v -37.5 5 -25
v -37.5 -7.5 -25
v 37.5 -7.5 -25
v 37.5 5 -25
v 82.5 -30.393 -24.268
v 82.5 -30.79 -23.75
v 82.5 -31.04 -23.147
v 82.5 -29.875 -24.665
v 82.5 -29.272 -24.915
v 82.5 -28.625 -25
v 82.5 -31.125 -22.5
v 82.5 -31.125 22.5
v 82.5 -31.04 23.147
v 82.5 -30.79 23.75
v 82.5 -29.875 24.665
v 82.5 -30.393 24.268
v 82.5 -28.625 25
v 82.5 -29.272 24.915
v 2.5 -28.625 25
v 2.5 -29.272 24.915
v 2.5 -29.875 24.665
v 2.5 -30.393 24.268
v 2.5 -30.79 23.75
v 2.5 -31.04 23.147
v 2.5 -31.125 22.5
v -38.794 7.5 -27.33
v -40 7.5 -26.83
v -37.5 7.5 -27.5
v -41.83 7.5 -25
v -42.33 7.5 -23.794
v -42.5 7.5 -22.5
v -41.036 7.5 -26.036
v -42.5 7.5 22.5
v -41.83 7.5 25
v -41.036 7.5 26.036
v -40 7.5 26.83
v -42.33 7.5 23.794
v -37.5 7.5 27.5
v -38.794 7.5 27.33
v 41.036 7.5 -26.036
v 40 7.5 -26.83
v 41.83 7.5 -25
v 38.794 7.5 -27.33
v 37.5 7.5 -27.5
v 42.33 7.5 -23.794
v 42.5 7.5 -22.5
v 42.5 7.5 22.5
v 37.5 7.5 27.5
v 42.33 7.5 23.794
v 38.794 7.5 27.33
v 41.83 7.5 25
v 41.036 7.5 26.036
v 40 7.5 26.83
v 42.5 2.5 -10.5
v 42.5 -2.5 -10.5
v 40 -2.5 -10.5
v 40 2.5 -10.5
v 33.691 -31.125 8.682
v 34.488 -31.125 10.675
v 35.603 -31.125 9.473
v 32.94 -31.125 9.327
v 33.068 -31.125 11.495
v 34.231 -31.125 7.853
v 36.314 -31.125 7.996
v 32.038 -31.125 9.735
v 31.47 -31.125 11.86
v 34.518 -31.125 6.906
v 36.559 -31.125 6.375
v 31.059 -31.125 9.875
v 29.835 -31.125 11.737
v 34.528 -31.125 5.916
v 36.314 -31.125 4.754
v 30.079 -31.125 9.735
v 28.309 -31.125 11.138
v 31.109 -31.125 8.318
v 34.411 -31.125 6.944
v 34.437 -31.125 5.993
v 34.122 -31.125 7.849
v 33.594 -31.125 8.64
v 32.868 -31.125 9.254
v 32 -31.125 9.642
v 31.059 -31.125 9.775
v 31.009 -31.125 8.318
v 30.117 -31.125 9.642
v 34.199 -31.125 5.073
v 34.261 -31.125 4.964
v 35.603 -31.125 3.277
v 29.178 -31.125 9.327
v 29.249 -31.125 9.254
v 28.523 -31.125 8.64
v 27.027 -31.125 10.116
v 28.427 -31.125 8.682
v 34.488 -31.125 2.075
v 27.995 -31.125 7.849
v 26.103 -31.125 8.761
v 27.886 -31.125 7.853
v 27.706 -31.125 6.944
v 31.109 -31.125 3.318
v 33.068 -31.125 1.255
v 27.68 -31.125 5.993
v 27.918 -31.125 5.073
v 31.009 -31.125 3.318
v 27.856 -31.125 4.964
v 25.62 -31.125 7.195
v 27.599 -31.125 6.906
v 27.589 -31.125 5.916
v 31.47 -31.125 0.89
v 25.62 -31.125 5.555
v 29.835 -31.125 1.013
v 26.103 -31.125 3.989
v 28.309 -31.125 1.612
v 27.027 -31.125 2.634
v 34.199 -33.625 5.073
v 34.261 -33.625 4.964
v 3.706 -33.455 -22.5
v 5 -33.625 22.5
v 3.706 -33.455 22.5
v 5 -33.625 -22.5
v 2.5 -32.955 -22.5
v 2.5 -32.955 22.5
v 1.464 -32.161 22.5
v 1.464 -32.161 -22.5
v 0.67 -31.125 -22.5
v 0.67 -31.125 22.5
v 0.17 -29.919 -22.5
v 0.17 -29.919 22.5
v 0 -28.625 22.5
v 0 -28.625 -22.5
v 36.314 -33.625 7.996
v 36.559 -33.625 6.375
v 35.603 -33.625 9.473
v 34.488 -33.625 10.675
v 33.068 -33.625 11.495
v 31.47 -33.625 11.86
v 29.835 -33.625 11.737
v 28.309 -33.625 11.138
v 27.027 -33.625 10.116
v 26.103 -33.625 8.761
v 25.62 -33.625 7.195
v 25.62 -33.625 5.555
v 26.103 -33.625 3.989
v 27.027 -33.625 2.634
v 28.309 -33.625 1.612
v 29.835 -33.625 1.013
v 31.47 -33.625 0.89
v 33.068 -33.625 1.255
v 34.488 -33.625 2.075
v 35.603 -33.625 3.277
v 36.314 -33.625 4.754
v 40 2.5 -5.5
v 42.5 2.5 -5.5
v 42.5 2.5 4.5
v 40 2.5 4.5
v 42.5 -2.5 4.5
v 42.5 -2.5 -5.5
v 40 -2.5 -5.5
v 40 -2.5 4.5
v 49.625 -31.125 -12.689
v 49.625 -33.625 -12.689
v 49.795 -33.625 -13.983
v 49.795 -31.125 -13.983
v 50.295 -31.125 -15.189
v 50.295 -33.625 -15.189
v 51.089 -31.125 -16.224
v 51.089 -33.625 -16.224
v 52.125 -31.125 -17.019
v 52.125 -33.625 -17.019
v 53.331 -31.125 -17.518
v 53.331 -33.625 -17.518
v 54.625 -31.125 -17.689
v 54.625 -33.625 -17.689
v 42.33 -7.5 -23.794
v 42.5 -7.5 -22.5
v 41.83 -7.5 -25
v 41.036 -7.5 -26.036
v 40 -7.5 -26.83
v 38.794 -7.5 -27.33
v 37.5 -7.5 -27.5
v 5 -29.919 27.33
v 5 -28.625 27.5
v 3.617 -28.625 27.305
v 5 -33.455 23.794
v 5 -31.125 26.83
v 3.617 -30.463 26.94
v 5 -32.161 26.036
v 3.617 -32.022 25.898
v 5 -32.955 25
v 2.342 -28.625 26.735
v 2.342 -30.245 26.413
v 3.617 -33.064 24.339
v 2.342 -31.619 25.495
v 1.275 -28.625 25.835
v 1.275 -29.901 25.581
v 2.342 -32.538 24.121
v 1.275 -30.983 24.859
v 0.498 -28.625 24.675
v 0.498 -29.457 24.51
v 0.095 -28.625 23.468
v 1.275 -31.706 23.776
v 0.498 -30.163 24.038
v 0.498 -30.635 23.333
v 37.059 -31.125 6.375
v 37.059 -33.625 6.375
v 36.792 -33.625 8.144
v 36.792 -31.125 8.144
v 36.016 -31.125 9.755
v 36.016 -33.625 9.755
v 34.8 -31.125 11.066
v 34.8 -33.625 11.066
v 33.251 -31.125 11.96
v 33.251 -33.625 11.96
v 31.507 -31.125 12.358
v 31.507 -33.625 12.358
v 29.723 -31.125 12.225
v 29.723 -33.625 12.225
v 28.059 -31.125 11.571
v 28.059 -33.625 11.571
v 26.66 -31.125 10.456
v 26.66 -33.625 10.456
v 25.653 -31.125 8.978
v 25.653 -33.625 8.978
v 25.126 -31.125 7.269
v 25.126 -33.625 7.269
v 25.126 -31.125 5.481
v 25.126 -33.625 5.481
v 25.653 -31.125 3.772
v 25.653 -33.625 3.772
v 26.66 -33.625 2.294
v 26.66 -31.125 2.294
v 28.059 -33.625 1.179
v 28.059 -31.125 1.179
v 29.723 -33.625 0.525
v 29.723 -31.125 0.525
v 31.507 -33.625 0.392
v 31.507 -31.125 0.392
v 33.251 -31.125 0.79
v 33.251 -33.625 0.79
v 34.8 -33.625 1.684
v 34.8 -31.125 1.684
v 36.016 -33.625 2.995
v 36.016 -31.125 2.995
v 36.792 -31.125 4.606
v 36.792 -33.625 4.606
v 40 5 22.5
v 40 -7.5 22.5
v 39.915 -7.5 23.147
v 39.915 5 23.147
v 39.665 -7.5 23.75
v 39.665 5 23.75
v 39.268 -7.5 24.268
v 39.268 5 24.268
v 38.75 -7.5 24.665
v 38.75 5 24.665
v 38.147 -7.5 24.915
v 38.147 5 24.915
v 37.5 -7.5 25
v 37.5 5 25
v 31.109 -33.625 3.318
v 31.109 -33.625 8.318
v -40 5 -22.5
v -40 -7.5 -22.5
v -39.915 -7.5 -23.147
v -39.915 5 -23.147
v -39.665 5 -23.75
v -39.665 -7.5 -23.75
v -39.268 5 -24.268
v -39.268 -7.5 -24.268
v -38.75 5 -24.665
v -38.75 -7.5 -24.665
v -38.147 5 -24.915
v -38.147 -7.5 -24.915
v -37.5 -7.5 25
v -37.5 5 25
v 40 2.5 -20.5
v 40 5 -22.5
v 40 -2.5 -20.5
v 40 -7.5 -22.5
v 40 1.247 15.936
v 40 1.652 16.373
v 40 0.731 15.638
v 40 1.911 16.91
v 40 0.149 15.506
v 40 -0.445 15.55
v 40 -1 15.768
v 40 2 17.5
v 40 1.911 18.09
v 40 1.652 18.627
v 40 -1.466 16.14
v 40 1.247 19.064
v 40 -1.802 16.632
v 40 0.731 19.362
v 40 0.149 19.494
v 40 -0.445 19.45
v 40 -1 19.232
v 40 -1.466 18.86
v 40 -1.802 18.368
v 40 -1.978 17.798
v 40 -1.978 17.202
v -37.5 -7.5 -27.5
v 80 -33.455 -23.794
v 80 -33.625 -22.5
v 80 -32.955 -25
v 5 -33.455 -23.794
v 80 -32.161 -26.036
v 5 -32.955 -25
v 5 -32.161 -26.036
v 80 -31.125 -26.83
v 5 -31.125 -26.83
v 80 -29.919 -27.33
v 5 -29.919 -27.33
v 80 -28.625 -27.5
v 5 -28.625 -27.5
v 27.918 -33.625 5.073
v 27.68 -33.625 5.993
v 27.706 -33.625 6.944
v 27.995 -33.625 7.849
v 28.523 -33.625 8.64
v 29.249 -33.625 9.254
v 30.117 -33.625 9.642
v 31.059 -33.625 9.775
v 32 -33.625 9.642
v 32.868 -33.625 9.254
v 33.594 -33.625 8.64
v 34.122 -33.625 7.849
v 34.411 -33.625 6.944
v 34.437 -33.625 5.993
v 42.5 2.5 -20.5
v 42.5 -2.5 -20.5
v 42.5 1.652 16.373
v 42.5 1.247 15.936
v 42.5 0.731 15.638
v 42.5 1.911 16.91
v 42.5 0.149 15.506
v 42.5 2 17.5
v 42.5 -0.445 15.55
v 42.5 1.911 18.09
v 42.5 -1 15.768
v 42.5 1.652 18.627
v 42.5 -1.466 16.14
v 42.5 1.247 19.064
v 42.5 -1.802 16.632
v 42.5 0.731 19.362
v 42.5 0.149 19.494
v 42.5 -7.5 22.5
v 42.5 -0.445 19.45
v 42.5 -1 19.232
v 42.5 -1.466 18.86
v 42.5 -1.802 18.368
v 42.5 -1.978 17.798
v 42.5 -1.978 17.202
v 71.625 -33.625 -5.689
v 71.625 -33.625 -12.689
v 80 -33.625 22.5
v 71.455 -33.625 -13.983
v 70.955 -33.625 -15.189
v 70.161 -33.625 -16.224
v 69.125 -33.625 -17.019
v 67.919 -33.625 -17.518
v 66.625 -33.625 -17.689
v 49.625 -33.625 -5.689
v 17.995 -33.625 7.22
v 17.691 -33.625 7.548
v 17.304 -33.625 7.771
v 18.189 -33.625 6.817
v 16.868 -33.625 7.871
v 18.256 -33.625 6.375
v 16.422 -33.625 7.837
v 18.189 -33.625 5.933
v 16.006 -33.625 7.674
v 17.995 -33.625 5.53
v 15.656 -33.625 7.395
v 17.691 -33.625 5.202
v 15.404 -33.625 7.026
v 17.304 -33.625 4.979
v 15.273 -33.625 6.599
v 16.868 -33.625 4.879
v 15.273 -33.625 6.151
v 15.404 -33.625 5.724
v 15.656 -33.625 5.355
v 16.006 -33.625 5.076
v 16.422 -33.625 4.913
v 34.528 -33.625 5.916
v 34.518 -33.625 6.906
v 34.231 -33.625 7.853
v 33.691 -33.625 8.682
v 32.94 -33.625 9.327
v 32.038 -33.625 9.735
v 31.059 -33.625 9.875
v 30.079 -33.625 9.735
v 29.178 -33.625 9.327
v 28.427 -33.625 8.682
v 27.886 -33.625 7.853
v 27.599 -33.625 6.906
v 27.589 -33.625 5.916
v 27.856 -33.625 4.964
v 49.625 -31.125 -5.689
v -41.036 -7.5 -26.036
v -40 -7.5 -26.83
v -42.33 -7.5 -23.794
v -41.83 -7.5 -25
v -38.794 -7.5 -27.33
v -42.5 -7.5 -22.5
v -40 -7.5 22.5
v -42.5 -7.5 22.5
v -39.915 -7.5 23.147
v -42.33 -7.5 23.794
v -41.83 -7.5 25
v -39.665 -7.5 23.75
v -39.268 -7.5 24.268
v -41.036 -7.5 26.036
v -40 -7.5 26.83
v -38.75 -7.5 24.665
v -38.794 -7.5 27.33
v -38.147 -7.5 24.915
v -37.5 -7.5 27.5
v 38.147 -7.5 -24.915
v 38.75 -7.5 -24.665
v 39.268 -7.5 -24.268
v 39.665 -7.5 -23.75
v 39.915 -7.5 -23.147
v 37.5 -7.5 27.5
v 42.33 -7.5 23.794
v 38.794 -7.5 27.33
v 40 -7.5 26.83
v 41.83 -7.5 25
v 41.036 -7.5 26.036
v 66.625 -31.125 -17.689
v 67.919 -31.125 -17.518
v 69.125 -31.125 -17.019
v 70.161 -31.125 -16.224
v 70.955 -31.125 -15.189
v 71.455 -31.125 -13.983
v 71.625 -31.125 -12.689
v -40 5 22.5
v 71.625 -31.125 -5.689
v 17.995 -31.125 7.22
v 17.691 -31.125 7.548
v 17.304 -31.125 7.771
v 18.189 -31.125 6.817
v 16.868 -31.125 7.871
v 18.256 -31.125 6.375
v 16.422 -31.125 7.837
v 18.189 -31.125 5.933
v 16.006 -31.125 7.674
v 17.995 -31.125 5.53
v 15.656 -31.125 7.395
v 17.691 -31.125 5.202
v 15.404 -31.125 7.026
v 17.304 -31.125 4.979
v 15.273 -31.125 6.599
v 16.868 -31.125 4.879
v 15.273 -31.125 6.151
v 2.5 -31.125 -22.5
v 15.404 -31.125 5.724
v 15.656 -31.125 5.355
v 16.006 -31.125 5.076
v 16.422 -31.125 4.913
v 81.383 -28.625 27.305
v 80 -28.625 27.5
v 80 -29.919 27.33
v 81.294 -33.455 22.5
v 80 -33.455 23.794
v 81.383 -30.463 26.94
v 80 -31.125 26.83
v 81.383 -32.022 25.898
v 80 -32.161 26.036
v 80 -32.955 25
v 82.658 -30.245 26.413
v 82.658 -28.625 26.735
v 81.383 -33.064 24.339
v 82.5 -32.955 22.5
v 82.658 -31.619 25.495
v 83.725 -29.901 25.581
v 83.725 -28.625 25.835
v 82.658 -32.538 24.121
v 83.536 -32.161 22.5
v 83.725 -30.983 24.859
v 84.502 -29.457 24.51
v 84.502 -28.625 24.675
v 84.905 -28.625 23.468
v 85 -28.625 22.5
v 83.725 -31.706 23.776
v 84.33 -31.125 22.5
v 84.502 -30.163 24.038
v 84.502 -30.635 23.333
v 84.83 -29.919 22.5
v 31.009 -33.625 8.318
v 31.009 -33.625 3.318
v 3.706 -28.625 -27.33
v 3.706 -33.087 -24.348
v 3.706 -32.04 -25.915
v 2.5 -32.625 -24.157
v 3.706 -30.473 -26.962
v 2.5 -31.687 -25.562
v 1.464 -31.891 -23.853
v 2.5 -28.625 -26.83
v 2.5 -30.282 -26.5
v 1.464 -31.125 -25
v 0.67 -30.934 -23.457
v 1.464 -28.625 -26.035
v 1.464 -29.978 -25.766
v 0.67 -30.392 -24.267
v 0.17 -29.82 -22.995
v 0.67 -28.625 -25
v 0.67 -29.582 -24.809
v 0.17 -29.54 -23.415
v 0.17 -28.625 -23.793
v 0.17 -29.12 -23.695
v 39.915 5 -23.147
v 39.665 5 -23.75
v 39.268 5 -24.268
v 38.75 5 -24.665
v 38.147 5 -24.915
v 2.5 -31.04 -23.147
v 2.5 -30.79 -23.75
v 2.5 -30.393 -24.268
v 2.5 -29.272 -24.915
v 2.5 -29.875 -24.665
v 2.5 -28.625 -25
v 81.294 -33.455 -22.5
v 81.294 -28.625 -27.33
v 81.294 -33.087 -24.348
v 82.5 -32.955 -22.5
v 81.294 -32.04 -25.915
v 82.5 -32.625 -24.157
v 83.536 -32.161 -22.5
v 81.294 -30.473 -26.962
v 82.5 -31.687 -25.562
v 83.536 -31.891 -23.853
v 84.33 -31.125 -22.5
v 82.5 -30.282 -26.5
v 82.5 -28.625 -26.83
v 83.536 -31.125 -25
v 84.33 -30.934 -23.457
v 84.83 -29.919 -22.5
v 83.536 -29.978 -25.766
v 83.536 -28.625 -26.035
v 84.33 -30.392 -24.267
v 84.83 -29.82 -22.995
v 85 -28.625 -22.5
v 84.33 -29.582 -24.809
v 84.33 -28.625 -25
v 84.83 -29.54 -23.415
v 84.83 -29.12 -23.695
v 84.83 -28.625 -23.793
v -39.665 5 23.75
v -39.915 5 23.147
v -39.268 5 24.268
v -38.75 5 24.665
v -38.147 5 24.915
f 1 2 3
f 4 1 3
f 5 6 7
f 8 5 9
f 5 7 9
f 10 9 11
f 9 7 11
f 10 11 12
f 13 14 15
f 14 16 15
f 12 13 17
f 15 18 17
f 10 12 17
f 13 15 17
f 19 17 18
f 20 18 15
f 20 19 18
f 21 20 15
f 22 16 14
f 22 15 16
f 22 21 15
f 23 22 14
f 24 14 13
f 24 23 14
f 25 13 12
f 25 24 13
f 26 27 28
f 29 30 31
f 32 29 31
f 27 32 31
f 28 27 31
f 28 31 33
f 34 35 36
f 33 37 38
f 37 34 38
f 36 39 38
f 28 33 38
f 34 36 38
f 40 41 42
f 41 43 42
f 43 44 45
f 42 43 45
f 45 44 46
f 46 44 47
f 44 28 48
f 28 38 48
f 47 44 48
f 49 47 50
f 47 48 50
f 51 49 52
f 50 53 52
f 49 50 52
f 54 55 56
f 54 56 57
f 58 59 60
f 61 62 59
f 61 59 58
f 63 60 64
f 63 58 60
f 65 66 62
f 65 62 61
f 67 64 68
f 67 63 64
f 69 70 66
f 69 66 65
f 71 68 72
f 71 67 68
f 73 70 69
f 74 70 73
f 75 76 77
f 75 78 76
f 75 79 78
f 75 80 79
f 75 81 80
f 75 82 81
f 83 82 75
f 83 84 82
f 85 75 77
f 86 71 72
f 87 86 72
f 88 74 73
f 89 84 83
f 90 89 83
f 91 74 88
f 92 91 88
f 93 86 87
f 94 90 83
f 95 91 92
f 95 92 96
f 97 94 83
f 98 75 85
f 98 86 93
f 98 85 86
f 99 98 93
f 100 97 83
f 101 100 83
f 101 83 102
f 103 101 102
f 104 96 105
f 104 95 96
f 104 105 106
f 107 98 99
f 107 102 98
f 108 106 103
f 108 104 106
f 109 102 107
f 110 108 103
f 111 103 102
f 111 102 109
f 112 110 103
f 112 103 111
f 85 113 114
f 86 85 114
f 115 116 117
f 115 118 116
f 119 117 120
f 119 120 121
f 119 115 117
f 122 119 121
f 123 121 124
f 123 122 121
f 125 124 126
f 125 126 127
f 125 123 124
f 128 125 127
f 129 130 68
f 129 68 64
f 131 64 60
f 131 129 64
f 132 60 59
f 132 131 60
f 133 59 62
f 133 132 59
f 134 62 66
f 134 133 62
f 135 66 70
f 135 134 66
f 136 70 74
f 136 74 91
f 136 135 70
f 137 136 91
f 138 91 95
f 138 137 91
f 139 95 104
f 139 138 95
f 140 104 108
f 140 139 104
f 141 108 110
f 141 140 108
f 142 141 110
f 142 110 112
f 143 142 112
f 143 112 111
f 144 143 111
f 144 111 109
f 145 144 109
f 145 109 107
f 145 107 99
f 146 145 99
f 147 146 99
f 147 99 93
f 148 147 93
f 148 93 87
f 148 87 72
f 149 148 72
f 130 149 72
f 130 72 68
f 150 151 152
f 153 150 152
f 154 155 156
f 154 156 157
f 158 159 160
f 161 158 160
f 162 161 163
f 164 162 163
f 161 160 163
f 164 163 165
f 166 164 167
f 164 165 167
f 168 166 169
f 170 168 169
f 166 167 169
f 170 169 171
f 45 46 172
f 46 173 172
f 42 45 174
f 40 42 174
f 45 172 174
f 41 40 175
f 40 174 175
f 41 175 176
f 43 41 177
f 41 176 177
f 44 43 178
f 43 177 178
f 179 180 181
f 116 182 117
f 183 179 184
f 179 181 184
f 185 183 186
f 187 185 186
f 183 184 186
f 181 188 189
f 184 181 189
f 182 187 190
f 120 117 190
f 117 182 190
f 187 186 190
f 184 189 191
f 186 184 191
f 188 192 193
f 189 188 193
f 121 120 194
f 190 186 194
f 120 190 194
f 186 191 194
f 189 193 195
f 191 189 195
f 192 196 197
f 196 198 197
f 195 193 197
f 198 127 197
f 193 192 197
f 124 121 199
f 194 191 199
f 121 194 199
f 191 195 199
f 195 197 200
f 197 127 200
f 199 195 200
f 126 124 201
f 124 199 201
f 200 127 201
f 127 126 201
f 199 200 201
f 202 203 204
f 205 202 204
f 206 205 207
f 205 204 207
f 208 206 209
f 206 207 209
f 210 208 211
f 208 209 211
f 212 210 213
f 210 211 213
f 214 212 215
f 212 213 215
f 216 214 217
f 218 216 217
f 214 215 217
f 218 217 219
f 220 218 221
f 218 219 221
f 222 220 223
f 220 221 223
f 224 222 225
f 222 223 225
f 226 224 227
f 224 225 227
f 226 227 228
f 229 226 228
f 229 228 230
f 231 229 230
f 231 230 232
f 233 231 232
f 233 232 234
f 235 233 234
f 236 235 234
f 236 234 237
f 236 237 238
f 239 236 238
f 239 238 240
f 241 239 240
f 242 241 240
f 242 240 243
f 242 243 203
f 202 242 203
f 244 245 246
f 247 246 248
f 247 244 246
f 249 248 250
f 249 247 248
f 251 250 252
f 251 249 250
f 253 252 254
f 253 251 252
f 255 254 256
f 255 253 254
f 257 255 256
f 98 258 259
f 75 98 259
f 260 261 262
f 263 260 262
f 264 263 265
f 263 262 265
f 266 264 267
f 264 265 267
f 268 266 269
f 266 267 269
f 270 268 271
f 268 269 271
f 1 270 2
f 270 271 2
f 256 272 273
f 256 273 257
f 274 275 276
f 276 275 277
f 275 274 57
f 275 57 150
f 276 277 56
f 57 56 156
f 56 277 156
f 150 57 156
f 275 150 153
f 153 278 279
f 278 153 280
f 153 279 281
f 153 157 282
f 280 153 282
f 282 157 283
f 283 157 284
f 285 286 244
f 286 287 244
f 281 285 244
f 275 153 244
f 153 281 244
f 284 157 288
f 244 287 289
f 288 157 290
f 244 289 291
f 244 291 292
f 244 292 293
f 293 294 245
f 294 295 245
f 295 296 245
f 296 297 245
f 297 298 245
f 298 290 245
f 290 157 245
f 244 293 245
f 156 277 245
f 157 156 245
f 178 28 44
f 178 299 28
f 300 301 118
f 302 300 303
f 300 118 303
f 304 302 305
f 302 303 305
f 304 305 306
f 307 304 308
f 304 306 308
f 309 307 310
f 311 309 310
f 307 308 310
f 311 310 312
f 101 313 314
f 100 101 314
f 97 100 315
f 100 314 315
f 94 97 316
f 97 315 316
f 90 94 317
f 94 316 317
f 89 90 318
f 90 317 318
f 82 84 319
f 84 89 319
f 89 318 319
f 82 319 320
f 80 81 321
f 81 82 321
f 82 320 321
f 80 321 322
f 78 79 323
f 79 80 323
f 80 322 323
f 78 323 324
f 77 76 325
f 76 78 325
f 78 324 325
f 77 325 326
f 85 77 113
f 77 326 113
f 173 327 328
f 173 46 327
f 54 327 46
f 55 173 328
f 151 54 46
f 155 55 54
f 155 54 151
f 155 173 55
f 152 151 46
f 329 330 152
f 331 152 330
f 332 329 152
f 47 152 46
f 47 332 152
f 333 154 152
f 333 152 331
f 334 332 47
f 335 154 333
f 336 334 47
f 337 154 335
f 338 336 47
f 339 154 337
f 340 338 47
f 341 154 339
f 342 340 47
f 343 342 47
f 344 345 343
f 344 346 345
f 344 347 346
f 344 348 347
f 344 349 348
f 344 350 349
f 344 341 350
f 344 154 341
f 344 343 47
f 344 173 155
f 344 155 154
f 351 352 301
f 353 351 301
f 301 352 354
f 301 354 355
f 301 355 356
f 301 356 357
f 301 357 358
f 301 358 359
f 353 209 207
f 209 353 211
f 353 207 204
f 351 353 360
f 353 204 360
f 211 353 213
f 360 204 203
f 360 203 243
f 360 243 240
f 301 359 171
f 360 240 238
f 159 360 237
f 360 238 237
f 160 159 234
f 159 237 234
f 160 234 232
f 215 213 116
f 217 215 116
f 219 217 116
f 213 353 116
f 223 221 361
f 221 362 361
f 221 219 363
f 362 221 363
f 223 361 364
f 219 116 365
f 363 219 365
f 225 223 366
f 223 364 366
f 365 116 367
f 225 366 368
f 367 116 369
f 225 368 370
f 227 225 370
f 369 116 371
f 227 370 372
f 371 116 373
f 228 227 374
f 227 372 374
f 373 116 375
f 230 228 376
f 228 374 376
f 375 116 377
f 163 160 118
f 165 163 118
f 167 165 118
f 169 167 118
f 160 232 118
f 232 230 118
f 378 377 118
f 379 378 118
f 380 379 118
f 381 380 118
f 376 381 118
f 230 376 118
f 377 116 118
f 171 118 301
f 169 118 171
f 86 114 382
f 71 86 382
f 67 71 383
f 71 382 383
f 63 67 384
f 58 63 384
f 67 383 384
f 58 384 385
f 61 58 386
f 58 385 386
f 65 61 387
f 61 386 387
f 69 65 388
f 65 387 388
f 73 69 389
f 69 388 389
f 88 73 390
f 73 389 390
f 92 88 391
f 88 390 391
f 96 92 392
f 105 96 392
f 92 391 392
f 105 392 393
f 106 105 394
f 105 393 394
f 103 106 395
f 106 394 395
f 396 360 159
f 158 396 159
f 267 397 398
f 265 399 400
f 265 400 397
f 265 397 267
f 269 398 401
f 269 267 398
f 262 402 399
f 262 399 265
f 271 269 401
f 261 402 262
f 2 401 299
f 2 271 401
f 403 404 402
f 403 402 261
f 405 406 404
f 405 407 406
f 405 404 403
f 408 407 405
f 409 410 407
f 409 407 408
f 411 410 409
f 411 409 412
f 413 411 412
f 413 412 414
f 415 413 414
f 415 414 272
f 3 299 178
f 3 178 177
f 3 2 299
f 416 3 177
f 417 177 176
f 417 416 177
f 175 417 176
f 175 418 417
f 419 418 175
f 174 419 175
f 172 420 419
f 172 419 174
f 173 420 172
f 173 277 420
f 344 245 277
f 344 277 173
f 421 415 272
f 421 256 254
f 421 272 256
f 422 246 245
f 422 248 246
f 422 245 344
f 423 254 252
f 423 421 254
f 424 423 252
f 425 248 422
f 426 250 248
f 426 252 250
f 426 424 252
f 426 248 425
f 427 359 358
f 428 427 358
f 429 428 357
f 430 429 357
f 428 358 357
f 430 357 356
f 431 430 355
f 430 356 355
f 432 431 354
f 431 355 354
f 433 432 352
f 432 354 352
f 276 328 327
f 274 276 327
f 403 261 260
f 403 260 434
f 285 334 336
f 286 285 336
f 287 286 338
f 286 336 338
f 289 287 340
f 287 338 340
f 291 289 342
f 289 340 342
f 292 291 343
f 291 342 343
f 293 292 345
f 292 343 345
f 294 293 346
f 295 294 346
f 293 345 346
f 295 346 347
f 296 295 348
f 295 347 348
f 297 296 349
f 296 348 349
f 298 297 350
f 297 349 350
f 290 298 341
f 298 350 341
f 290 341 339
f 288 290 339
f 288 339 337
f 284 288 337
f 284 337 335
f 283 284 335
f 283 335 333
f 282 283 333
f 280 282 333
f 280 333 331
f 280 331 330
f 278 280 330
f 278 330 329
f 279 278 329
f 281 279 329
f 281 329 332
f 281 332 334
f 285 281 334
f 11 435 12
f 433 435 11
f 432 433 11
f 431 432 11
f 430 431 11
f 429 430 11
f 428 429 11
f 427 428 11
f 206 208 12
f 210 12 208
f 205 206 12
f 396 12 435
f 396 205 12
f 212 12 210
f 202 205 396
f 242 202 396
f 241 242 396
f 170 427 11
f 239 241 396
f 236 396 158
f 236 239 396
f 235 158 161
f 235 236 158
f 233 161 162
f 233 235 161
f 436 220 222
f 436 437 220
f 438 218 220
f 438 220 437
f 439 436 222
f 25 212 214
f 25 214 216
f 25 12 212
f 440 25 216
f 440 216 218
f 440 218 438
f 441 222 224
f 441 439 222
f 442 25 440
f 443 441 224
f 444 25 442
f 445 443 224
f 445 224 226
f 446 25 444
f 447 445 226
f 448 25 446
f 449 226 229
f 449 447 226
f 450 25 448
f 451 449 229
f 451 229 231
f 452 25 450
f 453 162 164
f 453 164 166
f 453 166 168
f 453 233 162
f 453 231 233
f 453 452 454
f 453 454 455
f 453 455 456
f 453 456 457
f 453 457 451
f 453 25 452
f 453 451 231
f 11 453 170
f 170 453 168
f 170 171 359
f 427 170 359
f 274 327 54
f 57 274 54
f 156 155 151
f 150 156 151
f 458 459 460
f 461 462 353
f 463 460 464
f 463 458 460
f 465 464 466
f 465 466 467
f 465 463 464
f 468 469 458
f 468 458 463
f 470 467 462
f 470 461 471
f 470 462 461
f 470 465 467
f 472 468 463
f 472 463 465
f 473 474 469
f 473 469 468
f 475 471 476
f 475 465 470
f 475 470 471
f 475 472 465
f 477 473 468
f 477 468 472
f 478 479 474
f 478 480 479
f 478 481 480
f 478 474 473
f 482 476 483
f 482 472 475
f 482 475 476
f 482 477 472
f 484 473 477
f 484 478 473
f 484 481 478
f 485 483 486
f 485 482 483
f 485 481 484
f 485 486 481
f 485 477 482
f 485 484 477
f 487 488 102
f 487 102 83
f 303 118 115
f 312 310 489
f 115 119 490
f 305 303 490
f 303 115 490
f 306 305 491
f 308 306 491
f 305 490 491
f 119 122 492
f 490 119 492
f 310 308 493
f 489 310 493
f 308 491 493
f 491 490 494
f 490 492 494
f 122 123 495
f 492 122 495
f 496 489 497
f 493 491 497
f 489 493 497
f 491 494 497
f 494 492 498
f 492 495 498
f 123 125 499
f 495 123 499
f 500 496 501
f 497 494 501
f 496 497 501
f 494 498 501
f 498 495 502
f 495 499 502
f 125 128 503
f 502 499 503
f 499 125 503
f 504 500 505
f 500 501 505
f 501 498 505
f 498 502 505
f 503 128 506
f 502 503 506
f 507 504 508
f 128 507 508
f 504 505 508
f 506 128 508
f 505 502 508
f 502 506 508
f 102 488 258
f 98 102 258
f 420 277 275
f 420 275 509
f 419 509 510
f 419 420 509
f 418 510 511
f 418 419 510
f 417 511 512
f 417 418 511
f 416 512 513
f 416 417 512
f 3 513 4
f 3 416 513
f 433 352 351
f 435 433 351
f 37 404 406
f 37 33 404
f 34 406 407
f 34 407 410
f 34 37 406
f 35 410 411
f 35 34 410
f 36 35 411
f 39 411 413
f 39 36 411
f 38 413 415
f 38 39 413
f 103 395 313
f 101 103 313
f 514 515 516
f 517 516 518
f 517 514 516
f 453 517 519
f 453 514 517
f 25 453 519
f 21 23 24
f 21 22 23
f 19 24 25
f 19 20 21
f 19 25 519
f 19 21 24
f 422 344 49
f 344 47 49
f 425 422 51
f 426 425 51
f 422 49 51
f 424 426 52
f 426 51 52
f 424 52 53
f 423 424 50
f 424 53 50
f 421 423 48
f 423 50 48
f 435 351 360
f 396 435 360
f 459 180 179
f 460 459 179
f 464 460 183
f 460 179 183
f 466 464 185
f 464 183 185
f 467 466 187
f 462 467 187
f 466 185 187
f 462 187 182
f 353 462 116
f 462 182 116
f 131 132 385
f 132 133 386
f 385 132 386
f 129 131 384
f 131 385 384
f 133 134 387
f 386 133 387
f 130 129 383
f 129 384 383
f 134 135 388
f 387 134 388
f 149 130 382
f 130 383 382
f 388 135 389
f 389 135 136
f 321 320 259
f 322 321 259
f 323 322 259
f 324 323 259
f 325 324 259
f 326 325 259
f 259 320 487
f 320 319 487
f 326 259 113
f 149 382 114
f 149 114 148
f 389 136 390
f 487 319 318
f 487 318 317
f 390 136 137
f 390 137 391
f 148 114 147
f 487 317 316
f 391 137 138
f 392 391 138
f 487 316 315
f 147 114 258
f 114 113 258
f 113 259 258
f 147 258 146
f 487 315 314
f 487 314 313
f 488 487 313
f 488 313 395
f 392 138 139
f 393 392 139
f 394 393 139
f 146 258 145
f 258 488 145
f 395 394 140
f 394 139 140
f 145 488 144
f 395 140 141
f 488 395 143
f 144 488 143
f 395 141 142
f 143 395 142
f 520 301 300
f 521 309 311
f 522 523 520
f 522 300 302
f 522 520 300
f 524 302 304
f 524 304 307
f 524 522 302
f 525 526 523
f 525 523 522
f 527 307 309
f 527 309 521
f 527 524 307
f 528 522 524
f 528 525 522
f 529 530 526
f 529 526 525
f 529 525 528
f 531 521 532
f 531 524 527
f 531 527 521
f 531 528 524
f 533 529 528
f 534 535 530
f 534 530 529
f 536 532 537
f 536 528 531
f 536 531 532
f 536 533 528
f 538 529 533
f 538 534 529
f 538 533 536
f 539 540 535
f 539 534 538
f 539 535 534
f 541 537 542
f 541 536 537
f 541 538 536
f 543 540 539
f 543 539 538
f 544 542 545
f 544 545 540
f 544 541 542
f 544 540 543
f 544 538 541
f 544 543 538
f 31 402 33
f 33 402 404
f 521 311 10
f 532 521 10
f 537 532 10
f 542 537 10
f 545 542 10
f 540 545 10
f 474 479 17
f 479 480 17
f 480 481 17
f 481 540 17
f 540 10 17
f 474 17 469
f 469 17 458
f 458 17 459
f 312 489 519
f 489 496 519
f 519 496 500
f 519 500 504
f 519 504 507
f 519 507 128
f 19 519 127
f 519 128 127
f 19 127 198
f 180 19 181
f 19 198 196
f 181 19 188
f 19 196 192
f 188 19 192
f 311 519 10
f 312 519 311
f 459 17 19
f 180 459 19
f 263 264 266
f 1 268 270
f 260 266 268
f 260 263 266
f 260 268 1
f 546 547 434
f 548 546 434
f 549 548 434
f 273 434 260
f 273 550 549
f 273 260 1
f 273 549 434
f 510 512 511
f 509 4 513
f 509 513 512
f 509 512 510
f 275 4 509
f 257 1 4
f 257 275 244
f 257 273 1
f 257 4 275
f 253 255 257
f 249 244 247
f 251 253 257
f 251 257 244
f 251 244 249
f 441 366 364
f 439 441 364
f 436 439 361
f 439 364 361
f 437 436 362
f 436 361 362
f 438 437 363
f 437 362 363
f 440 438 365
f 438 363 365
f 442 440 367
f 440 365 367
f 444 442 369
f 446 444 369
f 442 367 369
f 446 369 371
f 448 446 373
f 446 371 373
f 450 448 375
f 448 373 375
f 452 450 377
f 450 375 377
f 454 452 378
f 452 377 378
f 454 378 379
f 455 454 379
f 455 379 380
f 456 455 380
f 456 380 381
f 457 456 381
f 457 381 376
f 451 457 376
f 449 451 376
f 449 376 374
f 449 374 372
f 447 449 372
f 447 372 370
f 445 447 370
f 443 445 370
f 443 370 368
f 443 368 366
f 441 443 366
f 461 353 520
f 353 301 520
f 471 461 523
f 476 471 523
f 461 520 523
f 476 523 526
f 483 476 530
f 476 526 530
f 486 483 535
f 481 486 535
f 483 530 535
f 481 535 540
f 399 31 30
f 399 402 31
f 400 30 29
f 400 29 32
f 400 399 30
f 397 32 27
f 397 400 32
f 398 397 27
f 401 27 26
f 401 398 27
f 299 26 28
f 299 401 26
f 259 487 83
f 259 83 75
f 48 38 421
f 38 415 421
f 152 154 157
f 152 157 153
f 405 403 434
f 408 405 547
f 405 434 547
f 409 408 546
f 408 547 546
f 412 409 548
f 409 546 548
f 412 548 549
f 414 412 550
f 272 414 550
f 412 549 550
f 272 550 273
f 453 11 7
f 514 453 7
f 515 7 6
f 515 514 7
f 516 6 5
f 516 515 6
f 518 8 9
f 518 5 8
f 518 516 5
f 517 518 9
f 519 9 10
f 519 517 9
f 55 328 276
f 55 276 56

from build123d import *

# Parameters (mm, degrees)
F0_W      = 85
F0_H      = 55
F1_DEPTH  = 7.5
F2_R      = 5
F3_T      = -2.5
F4_W      = 5
F4_H      = 10
F5_DEPTH  = 25
F6_R      = 2
F7_DEPTH  = 25
F9_DEPTH  = 85
F10_T     = -2.5
F11_R     = 6
F11_R_2   = 5.5
F11_R_3   = 1.5
F12_DEPTH = 25
F14_DEPTH = 25
F15_W     = 0.1
F15_H     = 5
F16_DEPTH = 25
F17_R     = 4.99999


# Not quite as in the source:
# - a fillet or chamfer is up to 0.001 mm smaller than in the source, because OpenCascade refuses the exact size


with BuildPart() as f1:
    # F0 (on Front) → F1 (new body, symmetric)
    with BuildSketch(Plane.XZ):
        Rectangle(F0_W, F0_H)
    extrude(amount=F1_DEPTH, both=True)

    # F2
    f2_edges = [f1.edges().sort_by_distance(p)[0] for p in [
        (-42.5, 0, 27.5),
        (42.5, 0, 27.5),
        (42.5, 0, -27.5),
        (-42.5, 0, -27.5),
    ]]
    fillet(f2_edges, radius=F2_R)

    # F3
    f3_openings = [f1.faces().sort_by_distance(p)[0] for p in [
        (0, -7.5, 0),
    ]]
    offset(amount=F3_T, openings=f3_openings)

    # F4 (on face) → F5 (cut)
    with BuildSketch(Plane.YZ.offset(42.5)):
        with Locations((0, -15.5)):
            Rectangle(F4_W, F4_H)
        with Locations((0, -0.5)):
            Rectangle(F4_W, F4_H)
    extrude(amount=-F5_DEPTH, mode=Mode.SUBTRACT)

    # F6 (on face) → F7 (cut)
    with BuildSketch(Plane.YZ.offset(42.5)):
        with Locations((0, 17.5)):
            Circle(F6_R)
    extrude(amount=-F7_DEPTH, mode=Mode.SUBTRACT)


with BuildPart() as f9:
    # F8 (on Right) → F9 (new body)
    with BuildSketch(Plane.YZ):
        with BuildLine():
            Line((-28.6249992251, -27.5), (-28.6249992251, 27.5))
            ThreePointArc((-28.6249992251, 27.5), (-32.1605331311, 26.0355339059), (-33.6249992251, 22.5))
            Line((-33.6249992251, 22.5), (-33.6249992251, -22.5))
            ThreePointArc((-33.6249992251, -22.5), (-32.1605331311, -26.0355339059), (-28.6249992251, -27.5))
        make_face()
    extrude(amount=F9_DEPTH)

    # F10
    f10_openings = [f9.faces().sort_by_distance(p)[0] for p in [
        (42.5, -28.624999, 0),
    ]]
    offset(amount=F10_T, openings=f10_openings)

    # F11 (on face) → F12 (cut)
    with BuildSketch(Plane.XZ.offset(33.6249992251)):
        with Locations((31.0585959434, 6.3749989495)):
            Circle(F11_R)
        with Locations((31.0585959434, 6.3749989495)):
            Circle(F11_R_2, mode=Mode.SUBTRACT)
        with Locations((16.7558868038, 6.3749989495)):
            Circle(F11_R_3)
    extrude(amount=-F12_DEPTH, mode=Mode.SUBTRACT)

    # F13 (on face) → F14 (cut)
    with BuildSketch(Plane.XZ.offset(33.6249992251)):
        with BuildLine():
            Line((71.6250017881, -5.6888253678), (49.6250017881, -5.6888253678))
            Line((49.6250017881, -5.6888253678), (49.6250017881, -12.6888253678))
            ThreePointArc((49.6250017881, -12.6888253678), (51.0894678822, -16.2243592737), (54.6250017881, -17.6888253678))
            Line((54.6250017881, -17.6888253678), (66.6250017881, -17.6888253678))
            ThreePointArc((66.6250017881, -17.6888253678), (70.1605356941, -16.2243592737), (71.6250017881, -12.6888253678))
            Line((71.6250017881, -12.6888253678), (71.6250017881, -5.6888253678))
        make_face()
    extrude(amount=-F14_DEPTH, mode=Mode.SUBTRACT)

    # F15 (on face) → F16 (cut)
    with BuildSketch(Plane.XZ.offset(33.6249992251)):
        with BuildLine():
            Line((34.1992405995, 5.0725584924), (34.261399235, 4.9635985542))
            ThreePointArc((34.261399235, 4.9635985542), (31.0585959434, 9.8749989495), (27.8557926519, 4.9635985542))
            Line((27.8557926519, 4.9635985542), (27.9179512873, 5.0725584924))
            ThreePointArc((27.9179512873, 5.0725584924), (31.0585959434, 9.7749989495), (34.1992405995, 5.0725584924))
        make_face()
        with Locations((31.0585959434, 5.8176338766)):
            Rectangle(F15_W, F15_H)
    extrude(amount=-F16_DEPTH, mode=Mode.SUBTRACT)

    # F17 (radius 5 in the source; OpenCascade refuses exactly that, so slightly less here)
    f17_edges = [f9.edges().sort_by_distance(p)[0] for p in [
        (0, -32.160533, 26.035534),
        (85, -33.624999, 0),
    ]]
    fillet(f17_edges, radius=F17_R)


solid = Compound([f1.part, f9.part])
